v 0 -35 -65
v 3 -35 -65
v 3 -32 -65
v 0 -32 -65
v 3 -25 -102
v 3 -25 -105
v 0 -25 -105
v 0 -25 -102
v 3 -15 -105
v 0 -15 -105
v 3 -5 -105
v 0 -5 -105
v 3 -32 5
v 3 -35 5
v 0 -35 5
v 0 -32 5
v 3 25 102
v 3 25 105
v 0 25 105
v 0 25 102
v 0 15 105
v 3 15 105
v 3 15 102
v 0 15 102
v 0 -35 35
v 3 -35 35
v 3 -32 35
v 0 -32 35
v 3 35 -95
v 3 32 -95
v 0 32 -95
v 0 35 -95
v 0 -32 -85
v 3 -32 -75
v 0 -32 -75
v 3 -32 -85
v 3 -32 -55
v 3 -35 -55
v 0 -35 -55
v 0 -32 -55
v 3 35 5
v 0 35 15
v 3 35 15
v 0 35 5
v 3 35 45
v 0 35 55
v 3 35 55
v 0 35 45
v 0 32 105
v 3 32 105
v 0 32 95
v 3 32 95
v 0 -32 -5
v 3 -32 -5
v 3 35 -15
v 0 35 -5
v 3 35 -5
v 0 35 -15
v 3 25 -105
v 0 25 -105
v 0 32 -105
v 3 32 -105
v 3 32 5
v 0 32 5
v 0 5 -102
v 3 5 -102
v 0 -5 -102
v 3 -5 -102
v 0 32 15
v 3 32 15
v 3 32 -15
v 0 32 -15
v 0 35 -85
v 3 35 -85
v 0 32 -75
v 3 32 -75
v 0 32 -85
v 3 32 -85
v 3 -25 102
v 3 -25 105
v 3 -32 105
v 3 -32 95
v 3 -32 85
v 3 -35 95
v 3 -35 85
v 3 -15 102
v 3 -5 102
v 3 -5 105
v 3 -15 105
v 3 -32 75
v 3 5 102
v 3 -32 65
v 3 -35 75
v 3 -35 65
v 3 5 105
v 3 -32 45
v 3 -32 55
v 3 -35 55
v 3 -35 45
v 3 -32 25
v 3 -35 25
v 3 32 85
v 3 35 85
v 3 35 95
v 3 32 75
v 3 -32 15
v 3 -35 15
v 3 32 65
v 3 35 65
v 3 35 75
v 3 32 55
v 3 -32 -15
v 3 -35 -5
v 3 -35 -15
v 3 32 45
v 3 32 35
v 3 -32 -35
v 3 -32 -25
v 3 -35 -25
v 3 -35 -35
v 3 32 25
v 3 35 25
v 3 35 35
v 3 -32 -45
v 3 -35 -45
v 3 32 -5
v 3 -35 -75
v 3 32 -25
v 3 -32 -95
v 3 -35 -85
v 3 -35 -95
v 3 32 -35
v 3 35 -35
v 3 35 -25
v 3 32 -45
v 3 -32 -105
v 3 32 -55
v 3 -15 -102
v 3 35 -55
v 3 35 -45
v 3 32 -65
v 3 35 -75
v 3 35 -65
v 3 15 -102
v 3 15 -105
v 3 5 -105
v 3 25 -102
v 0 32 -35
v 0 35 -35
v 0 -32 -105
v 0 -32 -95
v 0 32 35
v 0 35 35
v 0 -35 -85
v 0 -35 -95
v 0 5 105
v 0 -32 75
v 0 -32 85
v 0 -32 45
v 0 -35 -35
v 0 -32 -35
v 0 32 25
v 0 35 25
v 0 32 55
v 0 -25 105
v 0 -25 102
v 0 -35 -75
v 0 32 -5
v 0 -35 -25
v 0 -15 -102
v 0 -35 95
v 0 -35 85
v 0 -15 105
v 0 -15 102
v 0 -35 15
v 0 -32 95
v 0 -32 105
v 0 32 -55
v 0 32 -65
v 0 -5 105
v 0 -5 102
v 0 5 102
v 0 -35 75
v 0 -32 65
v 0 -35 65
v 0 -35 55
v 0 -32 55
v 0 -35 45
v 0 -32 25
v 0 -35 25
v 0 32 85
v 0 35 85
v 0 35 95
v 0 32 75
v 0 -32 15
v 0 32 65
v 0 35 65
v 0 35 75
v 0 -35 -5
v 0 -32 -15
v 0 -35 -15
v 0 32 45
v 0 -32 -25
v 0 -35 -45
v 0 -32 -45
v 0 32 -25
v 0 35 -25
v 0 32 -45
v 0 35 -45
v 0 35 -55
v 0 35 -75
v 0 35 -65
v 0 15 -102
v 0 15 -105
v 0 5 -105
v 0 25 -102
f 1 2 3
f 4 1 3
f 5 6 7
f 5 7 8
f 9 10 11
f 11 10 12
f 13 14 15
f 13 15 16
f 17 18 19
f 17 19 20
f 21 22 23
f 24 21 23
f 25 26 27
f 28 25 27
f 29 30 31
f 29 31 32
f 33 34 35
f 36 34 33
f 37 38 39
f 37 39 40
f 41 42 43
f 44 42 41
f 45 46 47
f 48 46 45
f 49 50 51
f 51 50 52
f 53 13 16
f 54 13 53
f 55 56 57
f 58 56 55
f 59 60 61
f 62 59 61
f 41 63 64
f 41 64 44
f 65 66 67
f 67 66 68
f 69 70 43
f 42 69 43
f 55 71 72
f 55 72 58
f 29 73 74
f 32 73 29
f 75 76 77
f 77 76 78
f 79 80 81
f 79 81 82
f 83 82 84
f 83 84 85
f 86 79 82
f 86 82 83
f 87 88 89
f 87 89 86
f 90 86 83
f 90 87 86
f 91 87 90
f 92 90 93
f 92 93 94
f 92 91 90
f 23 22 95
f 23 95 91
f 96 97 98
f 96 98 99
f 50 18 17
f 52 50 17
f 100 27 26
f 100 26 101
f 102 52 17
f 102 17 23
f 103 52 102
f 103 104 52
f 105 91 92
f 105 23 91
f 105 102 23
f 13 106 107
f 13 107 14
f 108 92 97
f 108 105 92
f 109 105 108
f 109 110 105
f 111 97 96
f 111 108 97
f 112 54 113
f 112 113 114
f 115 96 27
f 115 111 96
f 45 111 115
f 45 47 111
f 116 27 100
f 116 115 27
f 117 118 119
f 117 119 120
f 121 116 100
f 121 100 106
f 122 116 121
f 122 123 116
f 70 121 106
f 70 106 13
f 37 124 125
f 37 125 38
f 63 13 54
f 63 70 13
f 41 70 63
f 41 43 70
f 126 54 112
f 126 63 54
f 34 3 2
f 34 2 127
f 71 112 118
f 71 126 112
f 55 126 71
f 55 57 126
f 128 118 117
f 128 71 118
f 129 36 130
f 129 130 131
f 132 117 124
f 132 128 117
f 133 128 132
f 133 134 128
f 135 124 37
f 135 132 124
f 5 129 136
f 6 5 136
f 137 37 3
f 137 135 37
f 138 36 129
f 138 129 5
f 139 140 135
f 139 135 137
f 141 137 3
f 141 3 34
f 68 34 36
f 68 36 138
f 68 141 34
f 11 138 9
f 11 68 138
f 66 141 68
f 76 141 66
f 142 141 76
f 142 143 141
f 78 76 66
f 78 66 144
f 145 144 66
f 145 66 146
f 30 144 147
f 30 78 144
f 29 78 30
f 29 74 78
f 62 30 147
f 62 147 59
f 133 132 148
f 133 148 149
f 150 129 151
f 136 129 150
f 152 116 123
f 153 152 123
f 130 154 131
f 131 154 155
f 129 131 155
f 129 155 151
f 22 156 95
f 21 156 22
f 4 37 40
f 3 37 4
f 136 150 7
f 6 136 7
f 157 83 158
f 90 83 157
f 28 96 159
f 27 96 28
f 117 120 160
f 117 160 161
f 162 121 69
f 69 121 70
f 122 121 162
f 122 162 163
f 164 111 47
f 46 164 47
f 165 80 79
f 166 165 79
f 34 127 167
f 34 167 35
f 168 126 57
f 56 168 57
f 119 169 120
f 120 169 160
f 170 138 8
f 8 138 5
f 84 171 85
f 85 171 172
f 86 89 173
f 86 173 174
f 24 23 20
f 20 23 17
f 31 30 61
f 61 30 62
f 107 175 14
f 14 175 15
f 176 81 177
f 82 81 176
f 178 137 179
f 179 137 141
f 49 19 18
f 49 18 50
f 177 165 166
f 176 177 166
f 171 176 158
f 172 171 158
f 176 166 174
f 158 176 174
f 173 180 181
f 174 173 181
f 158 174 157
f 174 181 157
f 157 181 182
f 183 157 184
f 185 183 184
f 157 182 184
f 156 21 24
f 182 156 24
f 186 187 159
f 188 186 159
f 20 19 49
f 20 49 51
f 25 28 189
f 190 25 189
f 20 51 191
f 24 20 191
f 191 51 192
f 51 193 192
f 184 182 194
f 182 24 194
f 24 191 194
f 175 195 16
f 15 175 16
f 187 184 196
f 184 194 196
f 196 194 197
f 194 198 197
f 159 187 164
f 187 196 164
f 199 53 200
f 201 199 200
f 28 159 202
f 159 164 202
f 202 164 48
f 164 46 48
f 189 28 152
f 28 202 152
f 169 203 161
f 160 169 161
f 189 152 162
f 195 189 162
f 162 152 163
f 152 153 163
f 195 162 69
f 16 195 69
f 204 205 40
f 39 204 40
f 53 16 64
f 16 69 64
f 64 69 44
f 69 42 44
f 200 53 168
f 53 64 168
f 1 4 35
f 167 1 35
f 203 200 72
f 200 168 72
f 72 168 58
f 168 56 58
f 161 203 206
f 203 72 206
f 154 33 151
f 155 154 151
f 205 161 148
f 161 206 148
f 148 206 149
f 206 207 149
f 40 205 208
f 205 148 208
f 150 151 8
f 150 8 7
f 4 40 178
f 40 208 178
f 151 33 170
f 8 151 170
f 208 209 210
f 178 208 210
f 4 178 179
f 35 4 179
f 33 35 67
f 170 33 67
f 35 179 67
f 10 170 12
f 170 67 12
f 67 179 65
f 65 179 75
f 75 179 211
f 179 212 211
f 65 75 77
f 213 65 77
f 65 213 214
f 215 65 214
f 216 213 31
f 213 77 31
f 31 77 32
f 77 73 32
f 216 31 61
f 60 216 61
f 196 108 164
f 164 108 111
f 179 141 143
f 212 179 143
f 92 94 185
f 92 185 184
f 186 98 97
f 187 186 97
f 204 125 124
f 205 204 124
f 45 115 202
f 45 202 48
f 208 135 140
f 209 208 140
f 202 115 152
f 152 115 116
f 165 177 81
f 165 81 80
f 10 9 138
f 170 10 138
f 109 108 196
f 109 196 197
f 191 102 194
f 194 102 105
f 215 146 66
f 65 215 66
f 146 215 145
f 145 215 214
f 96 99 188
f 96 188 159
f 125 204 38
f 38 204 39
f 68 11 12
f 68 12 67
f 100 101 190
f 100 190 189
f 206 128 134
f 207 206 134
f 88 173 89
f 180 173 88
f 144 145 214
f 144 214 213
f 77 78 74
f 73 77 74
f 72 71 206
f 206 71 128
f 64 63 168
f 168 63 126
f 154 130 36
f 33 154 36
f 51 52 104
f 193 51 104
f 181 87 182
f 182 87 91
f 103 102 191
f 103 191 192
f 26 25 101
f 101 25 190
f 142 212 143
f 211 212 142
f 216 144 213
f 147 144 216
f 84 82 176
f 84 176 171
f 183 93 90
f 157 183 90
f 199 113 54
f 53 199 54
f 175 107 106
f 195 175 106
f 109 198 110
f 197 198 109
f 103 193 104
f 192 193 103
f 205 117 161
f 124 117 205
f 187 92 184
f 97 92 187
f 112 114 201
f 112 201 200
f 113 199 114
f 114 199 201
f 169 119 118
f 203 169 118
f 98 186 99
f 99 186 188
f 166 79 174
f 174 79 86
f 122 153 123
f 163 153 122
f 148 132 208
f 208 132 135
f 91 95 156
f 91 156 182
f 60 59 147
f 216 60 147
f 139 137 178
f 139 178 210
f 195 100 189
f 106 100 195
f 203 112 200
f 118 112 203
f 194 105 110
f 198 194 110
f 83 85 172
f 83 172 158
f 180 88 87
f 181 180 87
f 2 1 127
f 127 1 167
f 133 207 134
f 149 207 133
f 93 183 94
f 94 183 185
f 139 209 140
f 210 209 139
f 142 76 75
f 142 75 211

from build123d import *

# Parameters (mm, degrees)
SKETCH1_W                = 210
SKETCH1_H                = 70
BOSS_EXTRUDE1_DEPTH      = 3
SKETCH2_W                = 10
SKETCH2_H                = 3
CUT_EXTRUDE1_DEPTH       = 3
LPATTERN1_COUNT          = 11
LPATTERN1_PITCH          = 20
MIRROR1_COPY_1_SKETCH_W  = 10
MIRROR1_COPY_1_SKETCH_H  = 3
MIRROR1_COPY_1_DEPTH     = 3
MIRROR1_COPY_2_SKETCH_W  = 10
MIRROR1_COPY_2_SKETCH_H  = 3
MIRROR1_COPY_2_DEPTH     = 3
MIRROR1_COPY_3_SKETCH_W  = 10
MIRROR1_COPY_3_SKETCH_H  = 3
MIRROR1_COPY_3_DEPTH     = 3
MIRROR1_COPY_4_SKETCH_W  = 10
MIRROR1_COPY_4_SKETCH_H  = 3
MIRROR1_COPY_4_DEPTH     = 3
MIRROR1_COPY_5_SKETCH_W  = 10
MIRROR1_COPY_5_SKETCH_H  = 3
MIRROR1_COPY_5_DEPTH     = 3
MIRROR1_COPY_6_SKETCH_W  = 10
MIRROR1_COPY_6_SKETCH_H  = 3
MIRROR1_COPY_6_DEPTH     = 3
MIRROR1_COPY_7_SKETCH_W  = 10
MIRROR1_COPY_7_SKETCH_H  = 3
MIRROR1_COPY_7_DEPTH     = 3
MIRROR1_COPY_8_SKETCH_W  = 10
MIRROR1_COPY_8_SKETCH_H  = 3
MIRROR1_COPY_8_DEPTH     = 3
MIRROR1_COPY_9_SKETCH_W  = 10
MIRROR1_COPY_9_SKETCH_H  = 3
MIRROR1_COPY_9_DEPTH     = 3
MIRROR1_COPY_10_SKETCH_W = 10
MIRROR1_COPY_10_SKETCH_H = 3
MIRROR1_COPY_10_DEPTH    = 3
SKETCH3_W                = 3
SKETCH3_H                = 10
CUT_EXTRUDE2_DEPTH       = 3
LPATTERN2_COUNT          = 3
LPATTERN2_PITCH          = 20
MIRROR2_COPY_1_SKETCH_W  = 3
MIRROR2_COPY_1_SKETCH_H  = 10
MIRROR2_COPY_1_DEPTH     = 3
MIRROR2_COPY_2_SKETCH_W  = 3
MIRROR2_COPY_2_SKETCH_H  = 10
MIRROR2_COPY_2_DEPTH     = 3


with BuildPart() as part:
    # Sketch1 → Boss-Extrude1 (new body)
    with BuildSketch(Plane(origin=(0, 0, 0), x_dir=(0, 0, -1), z_dir=(1, 0, 0))):
        Rectangle(SKETCH1_W, SKETCH1_H)
    extrude(amount=BOSS_EXTRUDE1_DEPTH)

    # Sketch2 → Cut-Extrude1 (cut)
    with BuildSketch(Plane(origin=(3, 0, 0), x_dir=(0, 0, -1), z_dir=(1, 0, 0))):
        with Locations((-100, 33.5)):
            Rectangle(SKETCH2_W, SKETCH2_H)
    cut_extrude1 = extrude(amount=-CUT_EXTRUDE1_DEPTH, mode=Mode.SUBTRACT)

    # LPattern1: Cut-Extrude1 ×11
    with Locations(*[(0, 0, -i * LPATTERN1_PITCH) for i in range(1, LPATTERN1_COUNT)]):
        add(cut_extrude1, mode=Mode.SUBTRACT)

    # Mirror1: Cut-Extrude1 across plane
    add(cut_extrude1.mirror(Plane.ZX), mode=Mode.SUBTRACT)

    # Mirror1 copy 1 sketch → Mirror1 copy 1 (cut)
    with BuildSketch(Plane(origin=(3, 0, -20), x_dir=(0, 0, -1), z_dir=(1, 0, 0))):
        with Locations((-100, -33.5)):
            Rectangle(MIRROR1_COPY_1_SKETCH_W, MIRROR1_COPY_1_SKETCH_H)
    extrude(amount=-MIRROR1_COPY_1_DEPTH, mode=Mode.SUBTRACT)

    # Mirror1 copy 2 sketch → Mirror1 copy 2 (cut)
    with BuildSketch(Plane(origin=(3, 0, -40), x_dir=(0, 0, -1), z_dir=(1, 0, 0))):
        with Locations((-100, -33.5)):
            Rectangle(MIRROR1_COPY_2_SKETCH_W, MIRROR1_COPY_2_SKETCH_H)
    extrude(amount=-MIRROR1_COPY_2_DEPTH, mode=Mode.SUBTRACT)

    # Mirror1 copy 3 sketch → Mirror1 copy 3 (cut)
    with BuildSketch(Plane(origin=(3, 0, -60), x_dir=(0, 0, -1), z_dir=(1, 0, 0))):
        with Locations((-100, -33.5)):
            Rectangle(MIRROR1_COPY_3_SKETCH_W, MIRROR1_COPY_3_SKETCH_H)
    extrude(amount=-MIRROR1_COPY_3_DEPTH, mode=Mode.SUBTRACT)

    # Mirror1 copy 4 sketch → Mirror1 copy 4 (cut)
    with BuildSketch(Plane(origin=(3, 0, -80), x_dir=(0, 0, -1), z_dir=(1, 0, 0))):
        with Locations((-100, -33.5)):
            Rectangle(MIRROR1_COPY_4_SKETCH_W, MIRROR1_COPY_4_SKETCH_H)
    extrude(amount=-MIRROR1_COPY_4_DEPTH, mode=Mode.SUBTRACT)

    # Mirror1 copy 5 sketch → Mirror1 copy 5 (cut)
    with BuildSketch(Plane(origin=(3, 0, -100), x_dir=(0, 0, -1), z_dir=(1, 0, 0))):
        with Locations((-100, -33.5)):
            Rectangle(MIRROR1_COPY_5_SKETCH_W, MIRROR1_COPY_5_SKETCH_H)
    extrude(amount=-MIRROR1_COPY_5_DEPTH, mode=Mode.SUBTRACT)

    # Mirror1 copy 6 sketch → Mirror1 copy 6 (cut)
    with BuildSketch(Plane(origin=(3, 0, -120), x_dir=(0, 0, -1), z_dir=(1, 0, 0))):
        with Locations((-100, -33.5)):
            Rectangle(MIRROR1_COPY_6_SKETCH_W, MIRROR1_COPY_6_SKETCH_H)
    extrude(amount=-MIRROR1_COPY_6_DEPTH, mode=Mode.SUBTRACT)

    # Mirror1 copy 7 sketch → Mirror1 copy 7 (cut)
    with BuildSketch(Plane(origin=(3, 0, -140), x_dir=(0, 0, -1), z_dir=(1, 0, 0))):
        with Locations((-100, -33.5)):
            Rectangle(MIRROR1_COPY_7_SKETCH_W, MIRROR1_COPY_7_SKETCH_H)
    extrude(amount=-MIRROR1_COPY_7_DEPTH, mode=Mode.SUBTRACT)

    # Mirror1 copy 8 sketch → Mirror1 copy 8 (cut)
    with BuildSketch(Plane(origin=(3, 0, -160), x_dir=(0, 0, -1), z_dir=(1, 0, 0))):
        with Locations((-100, -33.5)):
            Rectangle(MIRROR1_COPY_8_SKETCH_W, MIRROR1_COPY_8_SKETCH_H)
    extrude(amount=-MIRROR1_COPY_8_DEPTH, mode=Mode.SUBTRACT)

    # Mirror1 copy 9 sketch → Mirror1 copy 9 (cut)
    with BuildSketch(Plane(origin=(3, 0, -180), x_dir=(0, 0, -1), z_dir=(1, 0, 0))):
        with Locations((-100, -33.5)):
            Rectangle(MIRROR1_COPY_9_SKETCH_W, MIRROR1_COPY_9_SKETCH_H)
    extrude(amount=-MIRROR1_COPY_9_DEPTH, mode=Mode.SUBTRACT)

    # Mirror1 copy 10 sketch → Mirror1 copy 10 (cut)
    with BuildSketch(Plane(origin=(3, 0, -200), x_dir=(0, 0, -1), z_dir=(1, 0, 0))):
        with Locations((-100, -33.5)):
            Rectangle(MIRROR1_COPY_10_SKETCH_W, MIRROR1_COPY_10_SKETCH_H)
    extrude(amount=-MIRROR1_COPY_10_DEPTH, mode=Mode.SUBTRACT)

    # Sketch3 → Cut-Extrude2 (cut)
    with BuildSketch(Plane(origin=(3, 0, 0), x_dir=(0, 0, -1), z_dir=(1, 0, 0))):
        with Locations((-103.5, 20)):
            Rectangle(SKETCH3_W, SKETCH3_H)
    cut_extrude2 = extrude(amount=-CUT_EXTRUDE2_DEPTH, mode=Mode.SUBTRACT)

    # LPattern2: Cut-Extrude2 ×3
    with Locations(*[(0, -i * LPATTERN2_PITCH, 0) for i in range(1, LPATTERN2_COUNT)]):
        add(cut_extrude2, mode=Mode.SUBTRACT)

    # Mirror2: Cut-Extrude2 across plane
    add(cut_extrude2.mirror(Plane.XY), mode=Mode.SUBTRACT)

    # Mirror2 copy 1 sketch → Mirror2 copy 1 (cut)
    with BuildSketch(Plane(origin=(3, -20, 0), x_dir=(0, 0, 1), z_dir=(1, 0, 0))):
        with Locations((-103.5, -20)):
            Rectangle(MIRROR2_COPY_1_SKETCH_W, MIRROR2_COPY_1_SKETCH_H)
    extrude(amount=-MIRROR2_COPY_1_DEPTH, mode=Mode.SUBTRACT)

    # Mirror2 copy 2 sketch → Mirror2 copy 2 (cut)
    with BuildSketch(Plane(origin=(3, -40, 0), x_dir=(0, 0, 1), z_dir=(1, 0, 0))):
        with Locations((-103.5, -20)):
            Rectangle(MIRROR2_COPY_2_SKETCH_W, MIRROR2_COPY_2_SKETCH_H)
    extrude(amount=-MIRROR2_COPY_2_DEPTH, mode=Mode.SUBTRACT)


solid = part.part
